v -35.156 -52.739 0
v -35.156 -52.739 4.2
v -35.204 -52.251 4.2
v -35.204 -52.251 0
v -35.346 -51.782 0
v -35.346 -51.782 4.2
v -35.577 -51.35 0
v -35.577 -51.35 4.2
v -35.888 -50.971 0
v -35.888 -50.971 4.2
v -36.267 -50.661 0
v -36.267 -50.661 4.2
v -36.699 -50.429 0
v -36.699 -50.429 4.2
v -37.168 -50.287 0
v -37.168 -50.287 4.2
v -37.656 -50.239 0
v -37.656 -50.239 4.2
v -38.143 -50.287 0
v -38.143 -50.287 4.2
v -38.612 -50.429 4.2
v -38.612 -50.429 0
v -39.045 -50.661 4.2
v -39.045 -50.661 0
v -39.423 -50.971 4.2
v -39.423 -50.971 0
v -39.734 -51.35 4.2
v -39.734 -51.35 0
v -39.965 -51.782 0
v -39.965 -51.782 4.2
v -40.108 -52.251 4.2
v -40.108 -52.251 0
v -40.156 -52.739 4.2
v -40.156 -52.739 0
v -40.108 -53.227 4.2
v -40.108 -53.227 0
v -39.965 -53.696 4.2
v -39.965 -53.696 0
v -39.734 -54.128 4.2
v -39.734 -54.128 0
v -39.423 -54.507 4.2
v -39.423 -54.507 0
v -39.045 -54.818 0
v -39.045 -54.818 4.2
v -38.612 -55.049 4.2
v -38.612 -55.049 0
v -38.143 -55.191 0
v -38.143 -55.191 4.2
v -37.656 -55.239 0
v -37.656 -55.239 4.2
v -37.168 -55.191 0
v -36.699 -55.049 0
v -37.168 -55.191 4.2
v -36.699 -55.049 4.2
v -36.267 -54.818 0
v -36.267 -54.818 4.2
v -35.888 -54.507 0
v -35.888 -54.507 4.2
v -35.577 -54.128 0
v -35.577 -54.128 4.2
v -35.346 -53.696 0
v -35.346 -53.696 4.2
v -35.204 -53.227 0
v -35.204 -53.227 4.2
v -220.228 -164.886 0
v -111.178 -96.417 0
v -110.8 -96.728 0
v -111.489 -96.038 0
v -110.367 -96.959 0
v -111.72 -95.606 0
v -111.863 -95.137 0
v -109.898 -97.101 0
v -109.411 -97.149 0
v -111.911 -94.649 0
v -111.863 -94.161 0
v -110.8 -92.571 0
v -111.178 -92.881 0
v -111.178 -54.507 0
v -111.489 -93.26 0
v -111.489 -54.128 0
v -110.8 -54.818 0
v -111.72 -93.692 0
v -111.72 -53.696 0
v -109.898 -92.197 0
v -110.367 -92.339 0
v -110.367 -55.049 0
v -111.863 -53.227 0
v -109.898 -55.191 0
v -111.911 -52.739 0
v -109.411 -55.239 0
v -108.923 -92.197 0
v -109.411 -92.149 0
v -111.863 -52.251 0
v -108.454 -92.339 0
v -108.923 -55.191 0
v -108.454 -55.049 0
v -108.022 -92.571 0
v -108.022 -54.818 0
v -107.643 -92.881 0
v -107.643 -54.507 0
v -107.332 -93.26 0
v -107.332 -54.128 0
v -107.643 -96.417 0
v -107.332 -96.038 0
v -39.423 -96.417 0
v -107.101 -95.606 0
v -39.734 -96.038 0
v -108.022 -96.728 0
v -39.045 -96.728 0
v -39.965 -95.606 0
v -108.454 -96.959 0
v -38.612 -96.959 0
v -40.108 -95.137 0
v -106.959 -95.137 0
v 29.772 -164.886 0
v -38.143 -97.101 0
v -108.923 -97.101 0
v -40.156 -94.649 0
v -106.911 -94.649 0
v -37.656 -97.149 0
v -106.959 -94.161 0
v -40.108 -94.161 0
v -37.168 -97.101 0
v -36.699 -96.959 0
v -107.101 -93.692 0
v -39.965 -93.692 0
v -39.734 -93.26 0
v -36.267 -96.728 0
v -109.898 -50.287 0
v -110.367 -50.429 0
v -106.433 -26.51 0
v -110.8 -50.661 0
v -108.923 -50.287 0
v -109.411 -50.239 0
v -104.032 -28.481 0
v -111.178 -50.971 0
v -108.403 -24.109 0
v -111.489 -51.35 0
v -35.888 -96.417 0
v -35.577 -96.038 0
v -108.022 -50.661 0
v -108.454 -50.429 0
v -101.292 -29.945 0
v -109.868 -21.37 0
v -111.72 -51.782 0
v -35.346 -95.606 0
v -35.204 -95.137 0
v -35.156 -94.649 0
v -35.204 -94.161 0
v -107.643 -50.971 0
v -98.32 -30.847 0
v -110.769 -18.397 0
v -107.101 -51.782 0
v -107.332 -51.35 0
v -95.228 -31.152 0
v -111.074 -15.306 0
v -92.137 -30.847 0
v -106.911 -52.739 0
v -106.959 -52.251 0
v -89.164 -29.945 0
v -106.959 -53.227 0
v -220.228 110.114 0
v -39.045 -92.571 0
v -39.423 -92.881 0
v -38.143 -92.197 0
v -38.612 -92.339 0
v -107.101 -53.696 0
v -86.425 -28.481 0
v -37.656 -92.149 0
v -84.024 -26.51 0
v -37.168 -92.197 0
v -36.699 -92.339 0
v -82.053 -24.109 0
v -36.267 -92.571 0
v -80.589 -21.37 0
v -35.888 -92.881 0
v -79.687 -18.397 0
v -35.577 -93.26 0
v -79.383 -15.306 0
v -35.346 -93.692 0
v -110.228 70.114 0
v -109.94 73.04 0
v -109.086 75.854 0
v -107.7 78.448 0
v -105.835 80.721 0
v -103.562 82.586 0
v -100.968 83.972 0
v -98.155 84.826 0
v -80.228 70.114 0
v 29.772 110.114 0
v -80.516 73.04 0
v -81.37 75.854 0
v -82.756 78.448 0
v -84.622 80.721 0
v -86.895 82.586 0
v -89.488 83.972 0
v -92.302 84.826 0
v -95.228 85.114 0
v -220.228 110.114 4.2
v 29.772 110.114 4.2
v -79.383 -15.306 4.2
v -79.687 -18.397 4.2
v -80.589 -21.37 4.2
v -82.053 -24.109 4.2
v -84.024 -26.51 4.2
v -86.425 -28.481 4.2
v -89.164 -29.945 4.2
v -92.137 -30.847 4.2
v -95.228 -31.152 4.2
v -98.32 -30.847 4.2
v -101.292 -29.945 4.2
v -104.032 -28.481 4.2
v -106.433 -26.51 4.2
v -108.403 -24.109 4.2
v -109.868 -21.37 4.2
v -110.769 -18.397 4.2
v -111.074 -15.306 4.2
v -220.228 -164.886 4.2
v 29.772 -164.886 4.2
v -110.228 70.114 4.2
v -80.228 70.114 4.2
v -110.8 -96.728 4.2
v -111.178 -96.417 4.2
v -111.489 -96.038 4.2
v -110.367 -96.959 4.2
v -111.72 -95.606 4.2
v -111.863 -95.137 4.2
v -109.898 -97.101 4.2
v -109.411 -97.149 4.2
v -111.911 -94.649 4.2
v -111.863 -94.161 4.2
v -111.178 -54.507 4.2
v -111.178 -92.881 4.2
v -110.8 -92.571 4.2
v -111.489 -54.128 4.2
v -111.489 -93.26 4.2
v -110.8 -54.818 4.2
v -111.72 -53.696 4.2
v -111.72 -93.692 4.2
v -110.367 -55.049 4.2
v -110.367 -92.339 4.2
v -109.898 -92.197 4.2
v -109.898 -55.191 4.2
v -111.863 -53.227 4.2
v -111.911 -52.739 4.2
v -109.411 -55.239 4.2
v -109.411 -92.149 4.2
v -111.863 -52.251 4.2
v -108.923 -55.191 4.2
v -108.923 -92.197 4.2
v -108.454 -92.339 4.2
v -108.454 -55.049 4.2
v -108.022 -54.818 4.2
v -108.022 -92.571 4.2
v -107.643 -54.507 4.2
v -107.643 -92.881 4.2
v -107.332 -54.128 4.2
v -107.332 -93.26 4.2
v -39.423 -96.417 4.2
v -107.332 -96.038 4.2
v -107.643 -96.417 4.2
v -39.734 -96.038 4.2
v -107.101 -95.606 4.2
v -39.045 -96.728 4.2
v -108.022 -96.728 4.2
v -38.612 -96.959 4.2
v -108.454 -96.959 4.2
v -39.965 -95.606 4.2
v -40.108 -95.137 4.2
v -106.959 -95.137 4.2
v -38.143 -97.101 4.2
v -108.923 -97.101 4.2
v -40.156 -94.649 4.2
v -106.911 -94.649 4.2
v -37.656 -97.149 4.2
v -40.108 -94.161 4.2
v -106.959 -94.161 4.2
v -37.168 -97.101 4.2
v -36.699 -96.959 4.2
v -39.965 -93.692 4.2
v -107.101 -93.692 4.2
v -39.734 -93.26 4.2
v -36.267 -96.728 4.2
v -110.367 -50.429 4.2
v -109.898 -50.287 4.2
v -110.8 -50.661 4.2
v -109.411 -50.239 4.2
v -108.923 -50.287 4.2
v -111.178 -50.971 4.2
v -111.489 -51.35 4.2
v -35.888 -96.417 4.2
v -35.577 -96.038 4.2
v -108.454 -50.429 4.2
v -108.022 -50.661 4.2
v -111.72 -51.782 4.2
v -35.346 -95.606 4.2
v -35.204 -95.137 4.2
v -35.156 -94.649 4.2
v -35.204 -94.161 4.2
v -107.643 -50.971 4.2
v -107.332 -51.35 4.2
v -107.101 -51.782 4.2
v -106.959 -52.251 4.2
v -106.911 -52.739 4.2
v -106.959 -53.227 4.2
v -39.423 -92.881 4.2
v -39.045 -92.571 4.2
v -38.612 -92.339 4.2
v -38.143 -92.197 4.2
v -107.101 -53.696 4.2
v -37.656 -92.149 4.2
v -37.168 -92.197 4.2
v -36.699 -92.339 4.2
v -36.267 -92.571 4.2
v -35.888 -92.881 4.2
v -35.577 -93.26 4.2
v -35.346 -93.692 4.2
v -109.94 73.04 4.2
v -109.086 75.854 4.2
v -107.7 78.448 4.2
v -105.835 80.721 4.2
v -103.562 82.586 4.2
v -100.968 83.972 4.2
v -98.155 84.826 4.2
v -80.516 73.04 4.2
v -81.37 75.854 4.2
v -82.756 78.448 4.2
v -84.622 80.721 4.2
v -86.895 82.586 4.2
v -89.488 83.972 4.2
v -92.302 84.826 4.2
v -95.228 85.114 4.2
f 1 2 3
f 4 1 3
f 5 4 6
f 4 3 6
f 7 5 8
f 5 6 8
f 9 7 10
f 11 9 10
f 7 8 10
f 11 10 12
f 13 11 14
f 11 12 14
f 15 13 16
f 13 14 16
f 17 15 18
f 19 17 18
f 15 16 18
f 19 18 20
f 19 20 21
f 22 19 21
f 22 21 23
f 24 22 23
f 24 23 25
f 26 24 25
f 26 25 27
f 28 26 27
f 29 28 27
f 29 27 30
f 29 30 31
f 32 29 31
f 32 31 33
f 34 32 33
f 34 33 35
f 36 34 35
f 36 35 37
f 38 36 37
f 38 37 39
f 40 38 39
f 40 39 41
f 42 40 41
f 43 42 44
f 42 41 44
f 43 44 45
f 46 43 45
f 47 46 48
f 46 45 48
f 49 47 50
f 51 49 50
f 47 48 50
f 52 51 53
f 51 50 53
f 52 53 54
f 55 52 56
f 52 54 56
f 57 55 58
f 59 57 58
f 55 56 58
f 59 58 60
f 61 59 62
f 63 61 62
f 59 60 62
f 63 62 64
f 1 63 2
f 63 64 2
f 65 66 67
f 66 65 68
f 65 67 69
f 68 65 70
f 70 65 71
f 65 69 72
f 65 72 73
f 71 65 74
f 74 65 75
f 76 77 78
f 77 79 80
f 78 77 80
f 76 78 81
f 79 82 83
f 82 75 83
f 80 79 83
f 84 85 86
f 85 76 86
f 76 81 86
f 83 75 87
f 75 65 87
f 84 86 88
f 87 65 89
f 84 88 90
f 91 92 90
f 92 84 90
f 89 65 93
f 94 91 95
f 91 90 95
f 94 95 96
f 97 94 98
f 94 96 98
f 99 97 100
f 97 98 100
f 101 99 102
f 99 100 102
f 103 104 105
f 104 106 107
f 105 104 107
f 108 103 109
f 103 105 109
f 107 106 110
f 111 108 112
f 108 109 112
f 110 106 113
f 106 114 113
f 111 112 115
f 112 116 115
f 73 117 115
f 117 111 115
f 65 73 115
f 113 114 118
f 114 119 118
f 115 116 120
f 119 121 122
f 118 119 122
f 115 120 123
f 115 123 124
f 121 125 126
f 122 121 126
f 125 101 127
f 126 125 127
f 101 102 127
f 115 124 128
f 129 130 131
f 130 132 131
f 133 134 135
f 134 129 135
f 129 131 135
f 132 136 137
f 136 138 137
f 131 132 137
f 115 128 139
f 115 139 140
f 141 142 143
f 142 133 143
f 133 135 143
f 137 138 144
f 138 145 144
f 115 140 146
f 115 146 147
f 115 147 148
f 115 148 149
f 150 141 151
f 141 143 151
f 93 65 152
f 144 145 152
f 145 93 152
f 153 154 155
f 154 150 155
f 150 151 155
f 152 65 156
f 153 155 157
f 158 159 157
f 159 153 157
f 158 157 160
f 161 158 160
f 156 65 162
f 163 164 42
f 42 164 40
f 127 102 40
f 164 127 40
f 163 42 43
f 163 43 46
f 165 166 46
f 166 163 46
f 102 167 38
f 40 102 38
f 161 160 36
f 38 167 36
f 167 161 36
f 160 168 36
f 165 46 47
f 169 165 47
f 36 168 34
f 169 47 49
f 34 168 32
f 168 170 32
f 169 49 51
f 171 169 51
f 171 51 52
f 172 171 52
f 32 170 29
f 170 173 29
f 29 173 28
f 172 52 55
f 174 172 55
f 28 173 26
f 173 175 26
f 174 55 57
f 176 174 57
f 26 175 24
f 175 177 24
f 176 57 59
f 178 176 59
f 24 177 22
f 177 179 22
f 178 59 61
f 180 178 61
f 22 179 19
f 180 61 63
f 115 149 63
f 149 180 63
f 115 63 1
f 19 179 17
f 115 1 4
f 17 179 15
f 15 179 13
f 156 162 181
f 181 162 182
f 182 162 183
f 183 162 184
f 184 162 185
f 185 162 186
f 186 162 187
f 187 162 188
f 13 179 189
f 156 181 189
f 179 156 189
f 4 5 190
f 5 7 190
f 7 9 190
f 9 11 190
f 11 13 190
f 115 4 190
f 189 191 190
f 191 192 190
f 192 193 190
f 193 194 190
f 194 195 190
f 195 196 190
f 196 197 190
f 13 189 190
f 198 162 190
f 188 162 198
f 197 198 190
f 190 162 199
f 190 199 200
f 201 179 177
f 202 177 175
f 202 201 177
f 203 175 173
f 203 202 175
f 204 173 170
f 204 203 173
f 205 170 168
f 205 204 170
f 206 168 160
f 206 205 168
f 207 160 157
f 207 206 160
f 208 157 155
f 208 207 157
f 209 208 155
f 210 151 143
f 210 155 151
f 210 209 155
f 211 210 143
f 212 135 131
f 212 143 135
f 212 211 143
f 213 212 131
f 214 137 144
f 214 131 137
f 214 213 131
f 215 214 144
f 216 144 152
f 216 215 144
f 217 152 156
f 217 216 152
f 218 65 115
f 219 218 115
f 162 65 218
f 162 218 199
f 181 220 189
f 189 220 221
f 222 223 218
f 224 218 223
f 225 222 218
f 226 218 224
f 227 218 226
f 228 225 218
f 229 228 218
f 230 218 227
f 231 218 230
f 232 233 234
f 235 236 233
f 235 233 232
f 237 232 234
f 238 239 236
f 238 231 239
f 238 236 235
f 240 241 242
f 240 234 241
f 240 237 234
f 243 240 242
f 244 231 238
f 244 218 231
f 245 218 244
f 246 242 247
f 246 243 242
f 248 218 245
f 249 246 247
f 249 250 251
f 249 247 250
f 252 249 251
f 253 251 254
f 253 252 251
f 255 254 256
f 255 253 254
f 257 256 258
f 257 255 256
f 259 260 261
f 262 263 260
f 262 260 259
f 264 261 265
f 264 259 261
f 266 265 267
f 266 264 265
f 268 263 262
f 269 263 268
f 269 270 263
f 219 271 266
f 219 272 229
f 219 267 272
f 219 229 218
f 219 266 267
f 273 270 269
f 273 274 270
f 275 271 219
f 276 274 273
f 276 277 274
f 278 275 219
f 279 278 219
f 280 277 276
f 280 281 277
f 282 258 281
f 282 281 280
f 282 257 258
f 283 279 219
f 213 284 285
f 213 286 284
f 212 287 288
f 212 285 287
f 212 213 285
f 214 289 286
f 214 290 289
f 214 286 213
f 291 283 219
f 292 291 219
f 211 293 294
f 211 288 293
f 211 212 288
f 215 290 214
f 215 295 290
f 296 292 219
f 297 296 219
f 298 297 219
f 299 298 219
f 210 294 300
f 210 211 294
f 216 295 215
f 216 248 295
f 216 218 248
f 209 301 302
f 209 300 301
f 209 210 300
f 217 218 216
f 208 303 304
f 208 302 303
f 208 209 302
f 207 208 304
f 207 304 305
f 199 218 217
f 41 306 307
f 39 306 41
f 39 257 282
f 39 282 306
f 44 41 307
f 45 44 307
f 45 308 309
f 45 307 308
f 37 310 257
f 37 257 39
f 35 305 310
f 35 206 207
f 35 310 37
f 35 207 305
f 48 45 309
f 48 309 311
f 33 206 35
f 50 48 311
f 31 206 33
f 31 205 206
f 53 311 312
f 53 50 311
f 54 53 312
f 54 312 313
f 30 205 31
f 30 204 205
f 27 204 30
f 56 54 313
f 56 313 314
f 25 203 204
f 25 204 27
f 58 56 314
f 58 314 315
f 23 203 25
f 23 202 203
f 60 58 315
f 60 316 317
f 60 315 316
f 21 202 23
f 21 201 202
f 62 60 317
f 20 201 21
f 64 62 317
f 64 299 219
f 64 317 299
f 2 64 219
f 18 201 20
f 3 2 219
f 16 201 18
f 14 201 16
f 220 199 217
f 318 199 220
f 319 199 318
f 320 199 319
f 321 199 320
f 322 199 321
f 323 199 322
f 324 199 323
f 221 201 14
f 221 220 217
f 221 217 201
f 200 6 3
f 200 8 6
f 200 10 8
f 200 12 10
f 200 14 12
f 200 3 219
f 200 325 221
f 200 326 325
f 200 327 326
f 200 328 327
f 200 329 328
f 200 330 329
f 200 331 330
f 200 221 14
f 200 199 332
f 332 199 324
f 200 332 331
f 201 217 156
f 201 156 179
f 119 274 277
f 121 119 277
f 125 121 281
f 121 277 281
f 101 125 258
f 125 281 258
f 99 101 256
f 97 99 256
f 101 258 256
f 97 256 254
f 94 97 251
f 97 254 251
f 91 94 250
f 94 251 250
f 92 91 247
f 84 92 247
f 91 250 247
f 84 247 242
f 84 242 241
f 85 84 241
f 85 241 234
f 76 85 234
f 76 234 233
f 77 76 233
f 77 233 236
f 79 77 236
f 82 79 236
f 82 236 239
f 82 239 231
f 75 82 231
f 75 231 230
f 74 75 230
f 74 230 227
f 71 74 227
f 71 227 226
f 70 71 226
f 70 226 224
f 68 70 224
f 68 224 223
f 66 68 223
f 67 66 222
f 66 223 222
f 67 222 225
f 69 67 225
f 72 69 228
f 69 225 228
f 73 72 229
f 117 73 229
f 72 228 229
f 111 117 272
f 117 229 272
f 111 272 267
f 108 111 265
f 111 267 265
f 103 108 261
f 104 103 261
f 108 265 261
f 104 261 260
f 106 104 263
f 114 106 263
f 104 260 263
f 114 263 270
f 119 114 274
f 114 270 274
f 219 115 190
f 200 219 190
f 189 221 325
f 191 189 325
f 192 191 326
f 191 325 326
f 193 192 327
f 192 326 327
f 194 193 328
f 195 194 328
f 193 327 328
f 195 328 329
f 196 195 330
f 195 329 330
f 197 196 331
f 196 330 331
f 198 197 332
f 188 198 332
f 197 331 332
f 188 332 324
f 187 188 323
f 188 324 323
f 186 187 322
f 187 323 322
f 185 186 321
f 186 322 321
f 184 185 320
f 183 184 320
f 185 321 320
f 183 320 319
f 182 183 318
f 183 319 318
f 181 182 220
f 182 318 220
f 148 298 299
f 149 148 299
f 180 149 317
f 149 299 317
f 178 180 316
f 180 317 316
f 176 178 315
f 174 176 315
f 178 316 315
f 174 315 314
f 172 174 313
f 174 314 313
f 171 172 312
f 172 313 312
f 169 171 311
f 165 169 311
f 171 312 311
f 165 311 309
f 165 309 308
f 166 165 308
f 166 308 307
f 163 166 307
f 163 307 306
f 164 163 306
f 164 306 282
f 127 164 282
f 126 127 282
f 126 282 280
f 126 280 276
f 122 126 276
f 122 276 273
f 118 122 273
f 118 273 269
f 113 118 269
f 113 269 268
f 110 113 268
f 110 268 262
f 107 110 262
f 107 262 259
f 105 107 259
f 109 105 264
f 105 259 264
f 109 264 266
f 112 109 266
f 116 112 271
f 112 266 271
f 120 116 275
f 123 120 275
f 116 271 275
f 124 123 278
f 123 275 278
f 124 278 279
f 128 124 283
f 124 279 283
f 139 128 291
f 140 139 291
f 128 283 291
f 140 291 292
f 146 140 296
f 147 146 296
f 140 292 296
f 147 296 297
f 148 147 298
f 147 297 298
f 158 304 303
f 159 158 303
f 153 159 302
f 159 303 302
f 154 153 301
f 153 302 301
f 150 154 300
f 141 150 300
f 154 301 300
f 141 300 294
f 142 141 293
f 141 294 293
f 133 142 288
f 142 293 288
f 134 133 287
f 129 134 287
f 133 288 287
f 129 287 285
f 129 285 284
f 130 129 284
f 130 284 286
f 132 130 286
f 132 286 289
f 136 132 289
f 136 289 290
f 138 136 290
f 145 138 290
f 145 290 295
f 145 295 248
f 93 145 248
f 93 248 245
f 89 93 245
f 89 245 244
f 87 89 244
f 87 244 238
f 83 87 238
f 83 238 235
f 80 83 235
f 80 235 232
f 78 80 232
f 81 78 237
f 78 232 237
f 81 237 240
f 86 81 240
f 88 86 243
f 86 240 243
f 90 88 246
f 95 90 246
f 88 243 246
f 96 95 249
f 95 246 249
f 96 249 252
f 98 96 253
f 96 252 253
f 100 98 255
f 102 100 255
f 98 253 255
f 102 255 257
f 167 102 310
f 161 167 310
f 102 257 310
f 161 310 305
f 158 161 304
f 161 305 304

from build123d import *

# Parameters (mm, degrees)
SKETCH1_W               = 250
SKETCH1_H               = 275
BOSS_EXTRUDE1_DEPTH     = 4.2
ESQUISSE1_R             = 2.50000008
ENL_V_MAT_EXTRU_1_DEPTH = 5.2


with BuildPart() as part:
    # Sketch1 → Boss-Extrude1 (new body)
    with BuildSketch(Plane.XY):
        with Locations((-95.228215768, -27.385892116)):
            Rectangle(SKETCH1_W, SKETCH1_H)
    extrude(amount=BOSS_EXTRUDE1_DEPTH)

    # Esquisse1 → Enlèv. mat.-Extru.1 (cut, through all)
    with BuildSketch(Plane.XY.offset(4.2)):
        with Locations((-37.655669773, -94.649179191)):
            Circle(ESQUISSE1_R)
        with Locations((-37.655669773, -52.739179191)):
            Circle(ESQUISSE1_R)
        with Locations((-109.410669773, -94.649179191)):
            Circle(ESQUISSE1_R)
        with Locations((-109.410669773, -52.739179191)):
            Circle(ESQUISSE1_R)
        with BuildLine():
            Line((-110.228215768, 70.114107884), (-80.228215768, 70.114107884))
            ThreePointArc((-80.228215768, 70.114107884), (-95.228215768, 85.114107884), (-110.228215768, 70.114107884))
        make_face()
        with BuildLine():
            Line((-111.073893882, -15.305892116), (-79.382537653, -15.305892116))
            ThreePointArc((-79.382537653, -15.305892116), (-95.228215768, -31.151570231), (-111.073893882, -15.305892116))
        make_face()
    extrude(amount=-ENL_V_MAT_EXTRU_1_DEPTH, mode=Mode.SUBTRACT)


solid = part.part
